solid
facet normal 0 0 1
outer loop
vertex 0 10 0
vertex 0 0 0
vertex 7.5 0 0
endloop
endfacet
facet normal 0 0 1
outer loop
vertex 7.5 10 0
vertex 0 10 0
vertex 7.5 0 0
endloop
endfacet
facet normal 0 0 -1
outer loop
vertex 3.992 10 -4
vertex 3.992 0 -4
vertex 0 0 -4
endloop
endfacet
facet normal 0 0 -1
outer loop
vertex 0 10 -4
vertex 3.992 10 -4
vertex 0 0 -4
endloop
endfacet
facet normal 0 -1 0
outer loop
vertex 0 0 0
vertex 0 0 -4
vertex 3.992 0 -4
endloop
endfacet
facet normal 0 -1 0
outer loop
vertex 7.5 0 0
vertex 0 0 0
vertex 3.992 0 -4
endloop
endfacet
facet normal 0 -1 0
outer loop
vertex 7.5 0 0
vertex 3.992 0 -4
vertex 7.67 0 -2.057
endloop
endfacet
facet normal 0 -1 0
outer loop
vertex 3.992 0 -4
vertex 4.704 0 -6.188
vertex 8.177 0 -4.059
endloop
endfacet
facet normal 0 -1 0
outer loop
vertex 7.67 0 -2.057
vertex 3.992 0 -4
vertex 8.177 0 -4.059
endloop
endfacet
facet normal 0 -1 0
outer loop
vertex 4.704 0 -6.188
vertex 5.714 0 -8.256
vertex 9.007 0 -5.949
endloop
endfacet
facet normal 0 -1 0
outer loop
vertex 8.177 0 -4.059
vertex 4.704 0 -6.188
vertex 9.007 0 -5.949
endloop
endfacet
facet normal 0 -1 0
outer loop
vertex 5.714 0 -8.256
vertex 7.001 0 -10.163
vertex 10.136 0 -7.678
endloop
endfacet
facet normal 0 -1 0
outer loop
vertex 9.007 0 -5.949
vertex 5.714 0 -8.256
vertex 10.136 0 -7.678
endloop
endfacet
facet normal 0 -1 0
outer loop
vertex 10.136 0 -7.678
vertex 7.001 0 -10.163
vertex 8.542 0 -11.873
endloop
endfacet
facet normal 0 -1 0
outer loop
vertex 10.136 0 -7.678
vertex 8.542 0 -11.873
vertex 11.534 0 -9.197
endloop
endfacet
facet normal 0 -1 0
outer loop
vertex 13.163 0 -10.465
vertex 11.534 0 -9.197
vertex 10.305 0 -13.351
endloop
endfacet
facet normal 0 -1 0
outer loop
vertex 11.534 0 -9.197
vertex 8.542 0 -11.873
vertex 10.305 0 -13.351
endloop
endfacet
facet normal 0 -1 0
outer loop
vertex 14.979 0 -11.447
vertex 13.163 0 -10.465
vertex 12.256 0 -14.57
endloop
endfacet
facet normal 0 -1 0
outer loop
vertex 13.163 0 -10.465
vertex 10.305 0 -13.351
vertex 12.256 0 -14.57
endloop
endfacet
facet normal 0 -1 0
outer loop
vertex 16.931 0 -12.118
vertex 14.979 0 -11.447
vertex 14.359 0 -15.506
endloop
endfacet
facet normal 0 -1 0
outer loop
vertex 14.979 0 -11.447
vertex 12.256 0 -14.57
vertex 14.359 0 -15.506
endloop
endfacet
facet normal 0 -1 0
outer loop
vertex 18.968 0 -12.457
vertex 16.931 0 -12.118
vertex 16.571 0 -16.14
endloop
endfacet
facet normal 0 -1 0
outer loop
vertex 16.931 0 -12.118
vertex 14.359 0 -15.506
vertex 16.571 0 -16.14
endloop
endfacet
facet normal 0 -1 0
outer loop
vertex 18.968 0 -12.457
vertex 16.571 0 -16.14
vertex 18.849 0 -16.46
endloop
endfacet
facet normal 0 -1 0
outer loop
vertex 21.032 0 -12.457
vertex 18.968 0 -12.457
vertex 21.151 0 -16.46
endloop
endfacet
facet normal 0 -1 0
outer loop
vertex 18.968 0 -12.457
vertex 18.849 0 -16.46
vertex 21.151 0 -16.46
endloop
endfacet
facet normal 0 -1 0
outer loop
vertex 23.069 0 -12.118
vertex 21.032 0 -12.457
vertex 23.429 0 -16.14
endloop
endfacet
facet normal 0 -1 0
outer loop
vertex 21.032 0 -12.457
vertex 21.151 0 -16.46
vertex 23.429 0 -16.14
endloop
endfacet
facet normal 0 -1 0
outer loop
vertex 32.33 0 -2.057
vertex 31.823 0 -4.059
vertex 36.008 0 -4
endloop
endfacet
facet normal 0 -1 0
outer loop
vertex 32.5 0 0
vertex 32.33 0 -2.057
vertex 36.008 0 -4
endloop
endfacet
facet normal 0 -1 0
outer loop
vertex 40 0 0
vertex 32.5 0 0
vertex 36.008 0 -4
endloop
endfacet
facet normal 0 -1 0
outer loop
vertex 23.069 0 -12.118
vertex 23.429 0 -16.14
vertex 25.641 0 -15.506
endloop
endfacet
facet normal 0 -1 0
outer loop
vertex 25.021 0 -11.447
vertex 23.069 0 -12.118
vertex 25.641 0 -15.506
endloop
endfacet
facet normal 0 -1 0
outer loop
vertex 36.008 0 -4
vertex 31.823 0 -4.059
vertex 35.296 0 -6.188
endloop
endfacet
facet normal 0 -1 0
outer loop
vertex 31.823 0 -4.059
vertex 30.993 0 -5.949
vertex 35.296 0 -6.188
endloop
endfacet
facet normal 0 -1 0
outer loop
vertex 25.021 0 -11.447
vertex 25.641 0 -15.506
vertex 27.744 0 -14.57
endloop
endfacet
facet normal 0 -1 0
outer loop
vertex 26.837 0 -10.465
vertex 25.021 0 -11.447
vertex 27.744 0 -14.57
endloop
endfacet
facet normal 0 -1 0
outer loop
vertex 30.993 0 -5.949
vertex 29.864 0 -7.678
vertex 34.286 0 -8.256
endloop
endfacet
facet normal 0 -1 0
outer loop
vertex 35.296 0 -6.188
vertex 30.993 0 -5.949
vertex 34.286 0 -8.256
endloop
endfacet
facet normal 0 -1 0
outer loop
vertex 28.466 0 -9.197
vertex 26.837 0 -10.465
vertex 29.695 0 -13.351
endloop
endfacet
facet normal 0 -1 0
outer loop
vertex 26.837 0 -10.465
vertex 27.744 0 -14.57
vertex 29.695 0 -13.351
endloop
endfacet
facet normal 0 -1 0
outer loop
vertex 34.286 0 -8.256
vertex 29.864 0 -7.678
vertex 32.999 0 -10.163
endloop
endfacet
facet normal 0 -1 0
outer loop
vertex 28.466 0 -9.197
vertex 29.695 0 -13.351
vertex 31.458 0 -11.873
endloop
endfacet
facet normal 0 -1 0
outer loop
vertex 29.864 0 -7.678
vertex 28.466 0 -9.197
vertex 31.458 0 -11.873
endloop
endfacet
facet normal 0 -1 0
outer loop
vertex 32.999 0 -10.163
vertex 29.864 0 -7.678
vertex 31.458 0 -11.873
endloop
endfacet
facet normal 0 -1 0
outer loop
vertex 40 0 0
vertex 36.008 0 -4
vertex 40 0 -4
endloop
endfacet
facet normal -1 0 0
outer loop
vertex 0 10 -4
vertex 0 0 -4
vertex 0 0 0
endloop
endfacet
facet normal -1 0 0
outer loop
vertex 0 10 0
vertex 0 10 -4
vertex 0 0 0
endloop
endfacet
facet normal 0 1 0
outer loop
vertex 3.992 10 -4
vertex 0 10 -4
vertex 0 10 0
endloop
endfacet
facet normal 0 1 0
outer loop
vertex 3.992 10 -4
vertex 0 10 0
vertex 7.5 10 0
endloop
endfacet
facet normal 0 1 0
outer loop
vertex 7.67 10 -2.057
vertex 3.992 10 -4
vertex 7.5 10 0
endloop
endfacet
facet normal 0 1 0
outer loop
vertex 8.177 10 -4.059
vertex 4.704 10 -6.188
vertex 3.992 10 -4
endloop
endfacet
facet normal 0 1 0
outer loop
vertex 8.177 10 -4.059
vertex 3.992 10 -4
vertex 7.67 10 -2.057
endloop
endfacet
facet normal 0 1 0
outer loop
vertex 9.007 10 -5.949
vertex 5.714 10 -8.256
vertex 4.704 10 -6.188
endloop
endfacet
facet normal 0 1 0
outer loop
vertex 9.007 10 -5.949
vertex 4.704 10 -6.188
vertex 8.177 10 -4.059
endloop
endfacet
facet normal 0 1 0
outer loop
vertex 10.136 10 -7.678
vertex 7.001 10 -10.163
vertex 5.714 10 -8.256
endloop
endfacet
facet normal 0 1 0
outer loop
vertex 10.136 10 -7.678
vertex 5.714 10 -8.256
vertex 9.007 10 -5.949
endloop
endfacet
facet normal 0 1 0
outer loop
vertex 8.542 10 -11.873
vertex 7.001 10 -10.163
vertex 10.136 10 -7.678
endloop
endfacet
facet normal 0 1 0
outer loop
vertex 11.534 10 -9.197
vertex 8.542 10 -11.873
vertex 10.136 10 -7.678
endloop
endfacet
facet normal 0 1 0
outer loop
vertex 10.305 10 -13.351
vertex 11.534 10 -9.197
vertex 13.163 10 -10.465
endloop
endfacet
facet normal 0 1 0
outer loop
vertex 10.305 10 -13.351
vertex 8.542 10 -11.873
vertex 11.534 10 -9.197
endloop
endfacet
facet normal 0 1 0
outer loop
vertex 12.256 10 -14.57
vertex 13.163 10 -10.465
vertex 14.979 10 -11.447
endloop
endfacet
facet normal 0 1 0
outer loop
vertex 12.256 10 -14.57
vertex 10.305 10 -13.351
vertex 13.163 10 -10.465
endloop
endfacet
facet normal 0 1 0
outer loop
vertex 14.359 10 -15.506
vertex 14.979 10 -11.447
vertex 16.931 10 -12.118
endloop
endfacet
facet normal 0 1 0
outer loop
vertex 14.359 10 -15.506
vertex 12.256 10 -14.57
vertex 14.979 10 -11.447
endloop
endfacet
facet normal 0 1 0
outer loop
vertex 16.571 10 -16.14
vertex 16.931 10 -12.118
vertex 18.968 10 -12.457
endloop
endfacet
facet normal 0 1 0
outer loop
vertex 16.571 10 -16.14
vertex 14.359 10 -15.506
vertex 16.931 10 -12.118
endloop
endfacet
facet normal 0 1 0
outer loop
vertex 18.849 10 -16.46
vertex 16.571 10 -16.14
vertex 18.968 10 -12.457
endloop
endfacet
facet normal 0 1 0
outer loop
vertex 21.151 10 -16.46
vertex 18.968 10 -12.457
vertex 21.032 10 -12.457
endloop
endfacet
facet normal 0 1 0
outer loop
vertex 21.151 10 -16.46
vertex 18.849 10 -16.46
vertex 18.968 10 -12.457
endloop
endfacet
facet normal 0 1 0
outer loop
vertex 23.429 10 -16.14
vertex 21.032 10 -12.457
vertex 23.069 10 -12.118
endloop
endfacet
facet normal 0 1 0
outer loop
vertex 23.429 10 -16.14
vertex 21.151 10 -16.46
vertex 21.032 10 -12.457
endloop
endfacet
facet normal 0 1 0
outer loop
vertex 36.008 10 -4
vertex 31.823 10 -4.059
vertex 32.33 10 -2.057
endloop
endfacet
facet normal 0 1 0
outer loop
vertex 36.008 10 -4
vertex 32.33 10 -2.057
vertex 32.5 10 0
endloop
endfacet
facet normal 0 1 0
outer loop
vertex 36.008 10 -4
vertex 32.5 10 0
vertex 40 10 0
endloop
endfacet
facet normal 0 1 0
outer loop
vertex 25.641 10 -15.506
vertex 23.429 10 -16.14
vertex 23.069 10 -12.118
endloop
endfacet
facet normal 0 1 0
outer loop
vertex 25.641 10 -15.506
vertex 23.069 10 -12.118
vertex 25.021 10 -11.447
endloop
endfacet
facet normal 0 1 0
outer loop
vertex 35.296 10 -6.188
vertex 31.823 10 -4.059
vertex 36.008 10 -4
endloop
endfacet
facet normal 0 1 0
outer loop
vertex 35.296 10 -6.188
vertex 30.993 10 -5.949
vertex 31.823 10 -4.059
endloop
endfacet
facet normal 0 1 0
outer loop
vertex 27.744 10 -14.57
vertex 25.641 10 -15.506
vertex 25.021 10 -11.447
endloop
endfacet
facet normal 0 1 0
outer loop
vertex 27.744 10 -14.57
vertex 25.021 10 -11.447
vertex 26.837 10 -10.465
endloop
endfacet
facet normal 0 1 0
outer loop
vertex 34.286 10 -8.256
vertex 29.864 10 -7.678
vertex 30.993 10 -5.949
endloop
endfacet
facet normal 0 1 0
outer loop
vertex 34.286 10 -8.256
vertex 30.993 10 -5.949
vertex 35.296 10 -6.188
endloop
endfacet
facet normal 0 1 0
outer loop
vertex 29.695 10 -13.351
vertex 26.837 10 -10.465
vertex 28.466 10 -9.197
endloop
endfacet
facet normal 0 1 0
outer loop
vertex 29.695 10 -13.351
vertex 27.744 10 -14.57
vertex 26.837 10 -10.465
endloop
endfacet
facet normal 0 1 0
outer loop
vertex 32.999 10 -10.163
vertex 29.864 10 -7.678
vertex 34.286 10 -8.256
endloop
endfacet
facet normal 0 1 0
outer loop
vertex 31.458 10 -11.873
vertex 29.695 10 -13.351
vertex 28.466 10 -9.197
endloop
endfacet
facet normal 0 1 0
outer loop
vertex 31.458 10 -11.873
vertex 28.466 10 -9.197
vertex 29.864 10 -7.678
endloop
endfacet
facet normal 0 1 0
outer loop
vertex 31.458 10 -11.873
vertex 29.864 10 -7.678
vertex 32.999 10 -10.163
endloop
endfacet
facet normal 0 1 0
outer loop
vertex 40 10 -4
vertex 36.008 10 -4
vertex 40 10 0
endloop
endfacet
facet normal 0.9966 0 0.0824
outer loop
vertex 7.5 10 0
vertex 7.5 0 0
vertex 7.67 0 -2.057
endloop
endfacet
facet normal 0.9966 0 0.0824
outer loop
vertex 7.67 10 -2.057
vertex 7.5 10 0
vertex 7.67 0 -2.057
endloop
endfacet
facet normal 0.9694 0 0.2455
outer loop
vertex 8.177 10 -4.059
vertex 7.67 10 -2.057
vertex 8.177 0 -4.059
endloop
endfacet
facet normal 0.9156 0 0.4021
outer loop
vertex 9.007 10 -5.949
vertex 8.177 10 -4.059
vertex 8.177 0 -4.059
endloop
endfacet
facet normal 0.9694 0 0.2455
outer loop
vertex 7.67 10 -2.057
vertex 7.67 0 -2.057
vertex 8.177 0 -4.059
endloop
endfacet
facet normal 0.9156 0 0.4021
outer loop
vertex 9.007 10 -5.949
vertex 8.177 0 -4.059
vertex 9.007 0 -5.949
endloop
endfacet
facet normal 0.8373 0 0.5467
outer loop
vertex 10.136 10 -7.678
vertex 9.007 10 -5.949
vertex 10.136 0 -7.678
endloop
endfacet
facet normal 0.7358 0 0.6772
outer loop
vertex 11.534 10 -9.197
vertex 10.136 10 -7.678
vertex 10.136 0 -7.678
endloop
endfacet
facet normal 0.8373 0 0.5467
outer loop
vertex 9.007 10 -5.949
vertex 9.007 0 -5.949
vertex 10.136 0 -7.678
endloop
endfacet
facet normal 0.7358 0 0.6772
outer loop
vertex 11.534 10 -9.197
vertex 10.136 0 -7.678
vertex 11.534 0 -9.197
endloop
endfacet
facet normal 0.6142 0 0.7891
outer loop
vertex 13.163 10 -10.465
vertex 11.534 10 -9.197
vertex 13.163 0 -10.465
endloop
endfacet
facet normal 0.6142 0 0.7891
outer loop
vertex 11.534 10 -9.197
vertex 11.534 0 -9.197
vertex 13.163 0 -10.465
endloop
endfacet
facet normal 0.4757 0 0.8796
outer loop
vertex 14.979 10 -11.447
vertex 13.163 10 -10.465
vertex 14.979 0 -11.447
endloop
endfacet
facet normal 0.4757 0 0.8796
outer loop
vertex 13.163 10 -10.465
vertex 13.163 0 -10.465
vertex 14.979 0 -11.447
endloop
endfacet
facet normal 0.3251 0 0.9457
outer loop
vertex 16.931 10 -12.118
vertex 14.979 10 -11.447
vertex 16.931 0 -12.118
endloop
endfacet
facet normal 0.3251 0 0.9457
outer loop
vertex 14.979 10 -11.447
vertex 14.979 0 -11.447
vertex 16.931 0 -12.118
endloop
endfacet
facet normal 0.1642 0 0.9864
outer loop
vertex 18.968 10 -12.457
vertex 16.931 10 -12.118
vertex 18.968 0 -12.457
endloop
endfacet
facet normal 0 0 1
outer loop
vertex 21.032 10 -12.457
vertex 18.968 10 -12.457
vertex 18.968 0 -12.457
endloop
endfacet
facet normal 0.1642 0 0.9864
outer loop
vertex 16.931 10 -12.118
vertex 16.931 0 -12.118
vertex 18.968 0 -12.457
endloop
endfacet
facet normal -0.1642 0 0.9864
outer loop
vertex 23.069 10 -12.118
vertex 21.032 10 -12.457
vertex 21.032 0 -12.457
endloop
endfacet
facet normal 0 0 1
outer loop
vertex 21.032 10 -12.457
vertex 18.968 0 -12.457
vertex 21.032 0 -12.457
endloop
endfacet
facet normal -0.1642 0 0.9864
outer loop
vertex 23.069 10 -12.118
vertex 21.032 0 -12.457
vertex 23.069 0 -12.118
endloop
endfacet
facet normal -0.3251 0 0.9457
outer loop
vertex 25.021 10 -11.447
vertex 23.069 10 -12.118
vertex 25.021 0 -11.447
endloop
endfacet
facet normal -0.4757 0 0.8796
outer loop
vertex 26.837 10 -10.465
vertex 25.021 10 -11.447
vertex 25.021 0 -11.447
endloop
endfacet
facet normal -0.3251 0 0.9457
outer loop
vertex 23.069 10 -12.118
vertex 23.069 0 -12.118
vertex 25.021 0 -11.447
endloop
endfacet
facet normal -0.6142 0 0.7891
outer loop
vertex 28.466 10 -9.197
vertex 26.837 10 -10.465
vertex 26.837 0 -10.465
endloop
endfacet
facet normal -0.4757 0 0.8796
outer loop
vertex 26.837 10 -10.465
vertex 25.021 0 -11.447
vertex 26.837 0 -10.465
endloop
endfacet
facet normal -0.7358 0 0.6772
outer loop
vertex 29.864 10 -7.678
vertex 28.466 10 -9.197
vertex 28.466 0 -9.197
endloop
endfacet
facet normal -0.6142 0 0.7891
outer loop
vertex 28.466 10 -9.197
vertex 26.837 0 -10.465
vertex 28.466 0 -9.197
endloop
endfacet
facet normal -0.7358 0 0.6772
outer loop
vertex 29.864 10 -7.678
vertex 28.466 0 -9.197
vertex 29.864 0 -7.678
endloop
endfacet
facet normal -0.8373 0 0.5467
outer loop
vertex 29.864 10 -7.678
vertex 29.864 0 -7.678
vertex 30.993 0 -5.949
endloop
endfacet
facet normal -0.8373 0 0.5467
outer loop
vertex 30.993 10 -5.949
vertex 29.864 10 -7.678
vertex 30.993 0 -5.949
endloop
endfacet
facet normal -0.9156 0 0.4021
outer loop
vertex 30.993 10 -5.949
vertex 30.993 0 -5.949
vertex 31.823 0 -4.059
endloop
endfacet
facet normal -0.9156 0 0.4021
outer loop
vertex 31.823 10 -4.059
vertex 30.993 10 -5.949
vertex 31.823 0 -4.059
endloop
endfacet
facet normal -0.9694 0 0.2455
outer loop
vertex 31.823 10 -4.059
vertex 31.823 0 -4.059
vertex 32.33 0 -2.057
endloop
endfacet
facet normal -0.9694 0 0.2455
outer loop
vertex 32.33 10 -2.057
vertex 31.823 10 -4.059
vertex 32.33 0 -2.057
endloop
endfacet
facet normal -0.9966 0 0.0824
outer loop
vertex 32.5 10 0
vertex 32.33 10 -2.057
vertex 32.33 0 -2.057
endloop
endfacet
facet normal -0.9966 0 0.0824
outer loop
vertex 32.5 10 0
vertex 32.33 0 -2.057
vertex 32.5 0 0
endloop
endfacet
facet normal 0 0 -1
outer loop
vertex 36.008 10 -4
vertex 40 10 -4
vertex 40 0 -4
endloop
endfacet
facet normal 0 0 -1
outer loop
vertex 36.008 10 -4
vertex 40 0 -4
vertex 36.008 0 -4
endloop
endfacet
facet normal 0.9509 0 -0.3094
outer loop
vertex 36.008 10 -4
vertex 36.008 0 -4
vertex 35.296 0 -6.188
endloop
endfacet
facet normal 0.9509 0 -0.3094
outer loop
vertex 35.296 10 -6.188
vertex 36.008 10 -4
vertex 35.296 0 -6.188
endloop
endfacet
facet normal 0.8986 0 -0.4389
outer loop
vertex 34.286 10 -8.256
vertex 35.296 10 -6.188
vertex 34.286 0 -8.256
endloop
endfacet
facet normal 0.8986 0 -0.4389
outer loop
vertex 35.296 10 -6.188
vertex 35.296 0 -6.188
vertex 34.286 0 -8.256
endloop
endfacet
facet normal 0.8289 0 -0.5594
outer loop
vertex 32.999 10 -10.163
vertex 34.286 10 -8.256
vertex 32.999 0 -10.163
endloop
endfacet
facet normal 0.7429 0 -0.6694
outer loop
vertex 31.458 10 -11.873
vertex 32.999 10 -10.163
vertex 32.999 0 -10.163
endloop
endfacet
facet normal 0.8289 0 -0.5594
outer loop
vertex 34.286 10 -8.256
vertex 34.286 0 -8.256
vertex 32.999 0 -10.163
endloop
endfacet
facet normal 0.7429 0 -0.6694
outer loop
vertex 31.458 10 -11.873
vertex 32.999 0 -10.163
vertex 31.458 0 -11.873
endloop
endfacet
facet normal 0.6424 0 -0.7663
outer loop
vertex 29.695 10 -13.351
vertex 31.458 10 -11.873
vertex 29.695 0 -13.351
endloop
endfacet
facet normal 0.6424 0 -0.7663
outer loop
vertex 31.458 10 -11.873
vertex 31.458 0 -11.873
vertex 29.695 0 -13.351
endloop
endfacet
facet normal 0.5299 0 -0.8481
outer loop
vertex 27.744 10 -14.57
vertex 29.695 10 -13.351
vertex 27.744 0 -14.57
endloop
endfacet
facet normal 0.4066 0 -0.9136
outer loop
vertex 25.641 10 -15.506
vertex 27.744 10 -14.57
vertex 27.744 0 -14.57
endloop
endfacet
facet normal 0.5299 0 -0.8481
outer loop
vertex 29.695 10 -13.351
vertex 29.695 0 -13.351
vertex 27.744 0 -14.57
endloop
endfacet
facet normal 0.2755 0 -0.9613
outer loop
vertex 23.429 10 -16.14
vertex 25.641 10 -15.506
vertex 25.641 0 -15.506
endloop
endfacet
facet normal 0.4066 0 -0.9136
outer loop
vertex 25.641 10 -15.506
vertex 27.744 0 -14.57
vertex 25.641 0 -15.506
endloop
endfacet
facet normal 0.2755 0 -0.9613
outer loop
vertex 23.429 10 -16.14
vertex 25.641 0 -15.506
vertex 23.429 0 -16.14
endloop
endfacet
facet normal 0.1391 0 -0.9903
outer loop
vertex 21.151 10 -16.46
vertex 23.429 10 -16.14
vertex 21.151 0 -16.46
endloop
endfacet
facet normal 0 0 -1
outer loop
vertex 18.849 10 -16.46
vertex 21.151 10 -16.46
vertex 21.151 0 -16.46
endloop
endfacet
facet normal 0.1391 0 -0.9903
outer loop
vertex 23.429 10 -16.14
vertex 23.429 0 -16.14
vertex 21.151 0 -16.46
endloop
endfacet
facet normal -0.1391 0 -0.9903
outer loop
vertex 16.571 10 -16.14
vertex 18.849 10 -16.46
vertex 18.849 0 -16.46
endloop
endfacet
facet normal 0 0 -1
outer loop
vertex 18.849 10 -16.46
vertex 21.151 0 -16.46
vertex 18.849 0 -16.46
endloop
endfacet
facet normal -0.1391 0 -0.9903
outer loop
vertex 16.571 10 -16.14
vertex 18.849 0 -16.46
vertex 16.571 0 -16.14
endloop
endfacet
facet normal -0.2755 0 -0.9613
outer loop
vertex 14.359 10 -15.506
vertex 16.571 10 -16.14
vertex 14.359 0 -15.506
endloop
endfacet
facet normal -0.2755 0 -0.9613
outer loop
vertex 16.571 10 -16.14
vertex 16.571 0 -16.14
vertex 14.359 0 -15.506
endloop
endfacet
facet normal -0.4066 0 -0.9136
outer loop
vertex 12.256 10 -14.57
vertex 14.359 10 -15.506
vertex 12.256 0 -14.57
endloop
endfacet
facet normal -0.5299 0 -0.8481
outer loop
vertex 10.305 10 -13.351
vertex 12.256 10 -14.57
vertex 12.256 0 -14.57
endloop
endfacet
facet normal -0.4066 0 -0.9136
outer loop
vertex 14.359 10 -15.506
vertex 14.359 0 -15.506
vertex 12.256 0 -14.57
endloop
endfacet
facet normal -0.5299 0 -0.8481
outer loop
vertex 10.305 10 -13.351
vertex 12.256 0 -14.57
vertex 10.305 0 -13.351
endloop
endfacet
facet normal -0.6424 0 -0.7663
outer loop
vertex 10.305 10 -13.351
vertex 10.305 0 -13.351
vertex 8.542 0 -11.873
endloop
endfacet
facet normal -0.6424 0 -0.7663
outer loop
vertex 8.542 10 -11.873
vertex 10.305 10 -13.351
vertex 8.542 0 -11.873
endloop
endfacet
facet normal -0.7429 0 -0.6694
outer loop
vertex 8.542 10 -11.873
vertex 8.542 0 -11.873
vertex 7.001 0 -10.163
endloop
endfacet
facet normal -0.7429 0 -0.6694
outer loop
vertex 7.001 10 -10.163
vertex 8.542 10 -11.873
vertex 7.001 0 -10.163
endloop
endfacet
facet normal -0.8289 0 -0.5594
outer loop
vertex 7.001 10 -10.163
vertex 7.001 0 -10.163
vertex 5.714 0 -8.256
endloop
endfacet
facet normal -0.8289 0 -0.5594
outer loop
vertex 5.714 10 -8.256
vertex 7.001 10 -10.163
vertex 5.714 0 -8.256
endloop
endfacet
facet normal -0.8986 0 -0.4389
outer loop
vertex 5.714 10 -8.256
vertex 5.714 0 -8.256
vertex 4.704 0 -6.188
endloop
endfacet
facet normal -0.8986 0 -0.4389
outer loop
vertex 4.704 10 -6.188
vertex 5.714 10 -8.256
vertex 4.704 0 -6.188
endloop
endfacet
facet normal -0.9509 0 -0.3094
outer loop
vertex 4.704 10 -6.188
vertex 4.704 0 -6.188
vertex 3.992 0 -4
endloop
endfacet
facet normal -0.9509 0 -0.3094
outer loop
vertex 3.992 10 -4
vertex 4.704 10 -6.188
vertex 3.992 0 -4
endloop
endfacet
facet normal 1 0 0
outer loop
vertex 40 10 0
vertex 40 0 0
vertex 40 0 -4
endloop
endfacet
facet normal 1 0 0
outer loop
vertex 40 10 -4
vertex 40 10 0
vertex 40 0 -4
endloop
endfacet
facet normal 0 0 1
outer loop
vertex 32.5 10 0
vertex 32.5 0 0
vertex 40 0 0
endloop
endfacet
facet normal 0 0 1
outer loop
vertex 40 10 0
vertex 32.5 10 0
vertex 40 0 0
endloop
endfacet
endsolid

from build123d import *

# Parameters (mm, degrees)
BOSS_EXTRUDE1_DEPTH = 10


with BuildPart() as part:
    # Sketch1 → Boss-Extrude1 (new body)
    with BuildSketch(Plane(origin=(0, 0, 0), x_dir=(1, 0, 0), z_dir=(0, 1, 0))):
        with BuildLine():
            Line((3.992189406, 4), (0, 4))
            Line((0, 4), (0, 0))
            Line((0, 0), (3.5, 0))
            Line((3.5, 0), (7.5, 0))
            ThreePointArc((7.5, 0), (20, 12.5), (32.5, 0))
            Line((32.5, 0), (36.5, 0))
            Line((36.5, 0), (40, 0))
            Line((40, 0), (40, 4))
            Line((40, 4), (36.007810594, 4))
            ThreePointArc((36.007810594, 4), (20, 16.5), (3.992189406, 4))
        make_face()
    extrude(amount=BOSS_EXTRUDE1_DEPTH)


solid = part.part
